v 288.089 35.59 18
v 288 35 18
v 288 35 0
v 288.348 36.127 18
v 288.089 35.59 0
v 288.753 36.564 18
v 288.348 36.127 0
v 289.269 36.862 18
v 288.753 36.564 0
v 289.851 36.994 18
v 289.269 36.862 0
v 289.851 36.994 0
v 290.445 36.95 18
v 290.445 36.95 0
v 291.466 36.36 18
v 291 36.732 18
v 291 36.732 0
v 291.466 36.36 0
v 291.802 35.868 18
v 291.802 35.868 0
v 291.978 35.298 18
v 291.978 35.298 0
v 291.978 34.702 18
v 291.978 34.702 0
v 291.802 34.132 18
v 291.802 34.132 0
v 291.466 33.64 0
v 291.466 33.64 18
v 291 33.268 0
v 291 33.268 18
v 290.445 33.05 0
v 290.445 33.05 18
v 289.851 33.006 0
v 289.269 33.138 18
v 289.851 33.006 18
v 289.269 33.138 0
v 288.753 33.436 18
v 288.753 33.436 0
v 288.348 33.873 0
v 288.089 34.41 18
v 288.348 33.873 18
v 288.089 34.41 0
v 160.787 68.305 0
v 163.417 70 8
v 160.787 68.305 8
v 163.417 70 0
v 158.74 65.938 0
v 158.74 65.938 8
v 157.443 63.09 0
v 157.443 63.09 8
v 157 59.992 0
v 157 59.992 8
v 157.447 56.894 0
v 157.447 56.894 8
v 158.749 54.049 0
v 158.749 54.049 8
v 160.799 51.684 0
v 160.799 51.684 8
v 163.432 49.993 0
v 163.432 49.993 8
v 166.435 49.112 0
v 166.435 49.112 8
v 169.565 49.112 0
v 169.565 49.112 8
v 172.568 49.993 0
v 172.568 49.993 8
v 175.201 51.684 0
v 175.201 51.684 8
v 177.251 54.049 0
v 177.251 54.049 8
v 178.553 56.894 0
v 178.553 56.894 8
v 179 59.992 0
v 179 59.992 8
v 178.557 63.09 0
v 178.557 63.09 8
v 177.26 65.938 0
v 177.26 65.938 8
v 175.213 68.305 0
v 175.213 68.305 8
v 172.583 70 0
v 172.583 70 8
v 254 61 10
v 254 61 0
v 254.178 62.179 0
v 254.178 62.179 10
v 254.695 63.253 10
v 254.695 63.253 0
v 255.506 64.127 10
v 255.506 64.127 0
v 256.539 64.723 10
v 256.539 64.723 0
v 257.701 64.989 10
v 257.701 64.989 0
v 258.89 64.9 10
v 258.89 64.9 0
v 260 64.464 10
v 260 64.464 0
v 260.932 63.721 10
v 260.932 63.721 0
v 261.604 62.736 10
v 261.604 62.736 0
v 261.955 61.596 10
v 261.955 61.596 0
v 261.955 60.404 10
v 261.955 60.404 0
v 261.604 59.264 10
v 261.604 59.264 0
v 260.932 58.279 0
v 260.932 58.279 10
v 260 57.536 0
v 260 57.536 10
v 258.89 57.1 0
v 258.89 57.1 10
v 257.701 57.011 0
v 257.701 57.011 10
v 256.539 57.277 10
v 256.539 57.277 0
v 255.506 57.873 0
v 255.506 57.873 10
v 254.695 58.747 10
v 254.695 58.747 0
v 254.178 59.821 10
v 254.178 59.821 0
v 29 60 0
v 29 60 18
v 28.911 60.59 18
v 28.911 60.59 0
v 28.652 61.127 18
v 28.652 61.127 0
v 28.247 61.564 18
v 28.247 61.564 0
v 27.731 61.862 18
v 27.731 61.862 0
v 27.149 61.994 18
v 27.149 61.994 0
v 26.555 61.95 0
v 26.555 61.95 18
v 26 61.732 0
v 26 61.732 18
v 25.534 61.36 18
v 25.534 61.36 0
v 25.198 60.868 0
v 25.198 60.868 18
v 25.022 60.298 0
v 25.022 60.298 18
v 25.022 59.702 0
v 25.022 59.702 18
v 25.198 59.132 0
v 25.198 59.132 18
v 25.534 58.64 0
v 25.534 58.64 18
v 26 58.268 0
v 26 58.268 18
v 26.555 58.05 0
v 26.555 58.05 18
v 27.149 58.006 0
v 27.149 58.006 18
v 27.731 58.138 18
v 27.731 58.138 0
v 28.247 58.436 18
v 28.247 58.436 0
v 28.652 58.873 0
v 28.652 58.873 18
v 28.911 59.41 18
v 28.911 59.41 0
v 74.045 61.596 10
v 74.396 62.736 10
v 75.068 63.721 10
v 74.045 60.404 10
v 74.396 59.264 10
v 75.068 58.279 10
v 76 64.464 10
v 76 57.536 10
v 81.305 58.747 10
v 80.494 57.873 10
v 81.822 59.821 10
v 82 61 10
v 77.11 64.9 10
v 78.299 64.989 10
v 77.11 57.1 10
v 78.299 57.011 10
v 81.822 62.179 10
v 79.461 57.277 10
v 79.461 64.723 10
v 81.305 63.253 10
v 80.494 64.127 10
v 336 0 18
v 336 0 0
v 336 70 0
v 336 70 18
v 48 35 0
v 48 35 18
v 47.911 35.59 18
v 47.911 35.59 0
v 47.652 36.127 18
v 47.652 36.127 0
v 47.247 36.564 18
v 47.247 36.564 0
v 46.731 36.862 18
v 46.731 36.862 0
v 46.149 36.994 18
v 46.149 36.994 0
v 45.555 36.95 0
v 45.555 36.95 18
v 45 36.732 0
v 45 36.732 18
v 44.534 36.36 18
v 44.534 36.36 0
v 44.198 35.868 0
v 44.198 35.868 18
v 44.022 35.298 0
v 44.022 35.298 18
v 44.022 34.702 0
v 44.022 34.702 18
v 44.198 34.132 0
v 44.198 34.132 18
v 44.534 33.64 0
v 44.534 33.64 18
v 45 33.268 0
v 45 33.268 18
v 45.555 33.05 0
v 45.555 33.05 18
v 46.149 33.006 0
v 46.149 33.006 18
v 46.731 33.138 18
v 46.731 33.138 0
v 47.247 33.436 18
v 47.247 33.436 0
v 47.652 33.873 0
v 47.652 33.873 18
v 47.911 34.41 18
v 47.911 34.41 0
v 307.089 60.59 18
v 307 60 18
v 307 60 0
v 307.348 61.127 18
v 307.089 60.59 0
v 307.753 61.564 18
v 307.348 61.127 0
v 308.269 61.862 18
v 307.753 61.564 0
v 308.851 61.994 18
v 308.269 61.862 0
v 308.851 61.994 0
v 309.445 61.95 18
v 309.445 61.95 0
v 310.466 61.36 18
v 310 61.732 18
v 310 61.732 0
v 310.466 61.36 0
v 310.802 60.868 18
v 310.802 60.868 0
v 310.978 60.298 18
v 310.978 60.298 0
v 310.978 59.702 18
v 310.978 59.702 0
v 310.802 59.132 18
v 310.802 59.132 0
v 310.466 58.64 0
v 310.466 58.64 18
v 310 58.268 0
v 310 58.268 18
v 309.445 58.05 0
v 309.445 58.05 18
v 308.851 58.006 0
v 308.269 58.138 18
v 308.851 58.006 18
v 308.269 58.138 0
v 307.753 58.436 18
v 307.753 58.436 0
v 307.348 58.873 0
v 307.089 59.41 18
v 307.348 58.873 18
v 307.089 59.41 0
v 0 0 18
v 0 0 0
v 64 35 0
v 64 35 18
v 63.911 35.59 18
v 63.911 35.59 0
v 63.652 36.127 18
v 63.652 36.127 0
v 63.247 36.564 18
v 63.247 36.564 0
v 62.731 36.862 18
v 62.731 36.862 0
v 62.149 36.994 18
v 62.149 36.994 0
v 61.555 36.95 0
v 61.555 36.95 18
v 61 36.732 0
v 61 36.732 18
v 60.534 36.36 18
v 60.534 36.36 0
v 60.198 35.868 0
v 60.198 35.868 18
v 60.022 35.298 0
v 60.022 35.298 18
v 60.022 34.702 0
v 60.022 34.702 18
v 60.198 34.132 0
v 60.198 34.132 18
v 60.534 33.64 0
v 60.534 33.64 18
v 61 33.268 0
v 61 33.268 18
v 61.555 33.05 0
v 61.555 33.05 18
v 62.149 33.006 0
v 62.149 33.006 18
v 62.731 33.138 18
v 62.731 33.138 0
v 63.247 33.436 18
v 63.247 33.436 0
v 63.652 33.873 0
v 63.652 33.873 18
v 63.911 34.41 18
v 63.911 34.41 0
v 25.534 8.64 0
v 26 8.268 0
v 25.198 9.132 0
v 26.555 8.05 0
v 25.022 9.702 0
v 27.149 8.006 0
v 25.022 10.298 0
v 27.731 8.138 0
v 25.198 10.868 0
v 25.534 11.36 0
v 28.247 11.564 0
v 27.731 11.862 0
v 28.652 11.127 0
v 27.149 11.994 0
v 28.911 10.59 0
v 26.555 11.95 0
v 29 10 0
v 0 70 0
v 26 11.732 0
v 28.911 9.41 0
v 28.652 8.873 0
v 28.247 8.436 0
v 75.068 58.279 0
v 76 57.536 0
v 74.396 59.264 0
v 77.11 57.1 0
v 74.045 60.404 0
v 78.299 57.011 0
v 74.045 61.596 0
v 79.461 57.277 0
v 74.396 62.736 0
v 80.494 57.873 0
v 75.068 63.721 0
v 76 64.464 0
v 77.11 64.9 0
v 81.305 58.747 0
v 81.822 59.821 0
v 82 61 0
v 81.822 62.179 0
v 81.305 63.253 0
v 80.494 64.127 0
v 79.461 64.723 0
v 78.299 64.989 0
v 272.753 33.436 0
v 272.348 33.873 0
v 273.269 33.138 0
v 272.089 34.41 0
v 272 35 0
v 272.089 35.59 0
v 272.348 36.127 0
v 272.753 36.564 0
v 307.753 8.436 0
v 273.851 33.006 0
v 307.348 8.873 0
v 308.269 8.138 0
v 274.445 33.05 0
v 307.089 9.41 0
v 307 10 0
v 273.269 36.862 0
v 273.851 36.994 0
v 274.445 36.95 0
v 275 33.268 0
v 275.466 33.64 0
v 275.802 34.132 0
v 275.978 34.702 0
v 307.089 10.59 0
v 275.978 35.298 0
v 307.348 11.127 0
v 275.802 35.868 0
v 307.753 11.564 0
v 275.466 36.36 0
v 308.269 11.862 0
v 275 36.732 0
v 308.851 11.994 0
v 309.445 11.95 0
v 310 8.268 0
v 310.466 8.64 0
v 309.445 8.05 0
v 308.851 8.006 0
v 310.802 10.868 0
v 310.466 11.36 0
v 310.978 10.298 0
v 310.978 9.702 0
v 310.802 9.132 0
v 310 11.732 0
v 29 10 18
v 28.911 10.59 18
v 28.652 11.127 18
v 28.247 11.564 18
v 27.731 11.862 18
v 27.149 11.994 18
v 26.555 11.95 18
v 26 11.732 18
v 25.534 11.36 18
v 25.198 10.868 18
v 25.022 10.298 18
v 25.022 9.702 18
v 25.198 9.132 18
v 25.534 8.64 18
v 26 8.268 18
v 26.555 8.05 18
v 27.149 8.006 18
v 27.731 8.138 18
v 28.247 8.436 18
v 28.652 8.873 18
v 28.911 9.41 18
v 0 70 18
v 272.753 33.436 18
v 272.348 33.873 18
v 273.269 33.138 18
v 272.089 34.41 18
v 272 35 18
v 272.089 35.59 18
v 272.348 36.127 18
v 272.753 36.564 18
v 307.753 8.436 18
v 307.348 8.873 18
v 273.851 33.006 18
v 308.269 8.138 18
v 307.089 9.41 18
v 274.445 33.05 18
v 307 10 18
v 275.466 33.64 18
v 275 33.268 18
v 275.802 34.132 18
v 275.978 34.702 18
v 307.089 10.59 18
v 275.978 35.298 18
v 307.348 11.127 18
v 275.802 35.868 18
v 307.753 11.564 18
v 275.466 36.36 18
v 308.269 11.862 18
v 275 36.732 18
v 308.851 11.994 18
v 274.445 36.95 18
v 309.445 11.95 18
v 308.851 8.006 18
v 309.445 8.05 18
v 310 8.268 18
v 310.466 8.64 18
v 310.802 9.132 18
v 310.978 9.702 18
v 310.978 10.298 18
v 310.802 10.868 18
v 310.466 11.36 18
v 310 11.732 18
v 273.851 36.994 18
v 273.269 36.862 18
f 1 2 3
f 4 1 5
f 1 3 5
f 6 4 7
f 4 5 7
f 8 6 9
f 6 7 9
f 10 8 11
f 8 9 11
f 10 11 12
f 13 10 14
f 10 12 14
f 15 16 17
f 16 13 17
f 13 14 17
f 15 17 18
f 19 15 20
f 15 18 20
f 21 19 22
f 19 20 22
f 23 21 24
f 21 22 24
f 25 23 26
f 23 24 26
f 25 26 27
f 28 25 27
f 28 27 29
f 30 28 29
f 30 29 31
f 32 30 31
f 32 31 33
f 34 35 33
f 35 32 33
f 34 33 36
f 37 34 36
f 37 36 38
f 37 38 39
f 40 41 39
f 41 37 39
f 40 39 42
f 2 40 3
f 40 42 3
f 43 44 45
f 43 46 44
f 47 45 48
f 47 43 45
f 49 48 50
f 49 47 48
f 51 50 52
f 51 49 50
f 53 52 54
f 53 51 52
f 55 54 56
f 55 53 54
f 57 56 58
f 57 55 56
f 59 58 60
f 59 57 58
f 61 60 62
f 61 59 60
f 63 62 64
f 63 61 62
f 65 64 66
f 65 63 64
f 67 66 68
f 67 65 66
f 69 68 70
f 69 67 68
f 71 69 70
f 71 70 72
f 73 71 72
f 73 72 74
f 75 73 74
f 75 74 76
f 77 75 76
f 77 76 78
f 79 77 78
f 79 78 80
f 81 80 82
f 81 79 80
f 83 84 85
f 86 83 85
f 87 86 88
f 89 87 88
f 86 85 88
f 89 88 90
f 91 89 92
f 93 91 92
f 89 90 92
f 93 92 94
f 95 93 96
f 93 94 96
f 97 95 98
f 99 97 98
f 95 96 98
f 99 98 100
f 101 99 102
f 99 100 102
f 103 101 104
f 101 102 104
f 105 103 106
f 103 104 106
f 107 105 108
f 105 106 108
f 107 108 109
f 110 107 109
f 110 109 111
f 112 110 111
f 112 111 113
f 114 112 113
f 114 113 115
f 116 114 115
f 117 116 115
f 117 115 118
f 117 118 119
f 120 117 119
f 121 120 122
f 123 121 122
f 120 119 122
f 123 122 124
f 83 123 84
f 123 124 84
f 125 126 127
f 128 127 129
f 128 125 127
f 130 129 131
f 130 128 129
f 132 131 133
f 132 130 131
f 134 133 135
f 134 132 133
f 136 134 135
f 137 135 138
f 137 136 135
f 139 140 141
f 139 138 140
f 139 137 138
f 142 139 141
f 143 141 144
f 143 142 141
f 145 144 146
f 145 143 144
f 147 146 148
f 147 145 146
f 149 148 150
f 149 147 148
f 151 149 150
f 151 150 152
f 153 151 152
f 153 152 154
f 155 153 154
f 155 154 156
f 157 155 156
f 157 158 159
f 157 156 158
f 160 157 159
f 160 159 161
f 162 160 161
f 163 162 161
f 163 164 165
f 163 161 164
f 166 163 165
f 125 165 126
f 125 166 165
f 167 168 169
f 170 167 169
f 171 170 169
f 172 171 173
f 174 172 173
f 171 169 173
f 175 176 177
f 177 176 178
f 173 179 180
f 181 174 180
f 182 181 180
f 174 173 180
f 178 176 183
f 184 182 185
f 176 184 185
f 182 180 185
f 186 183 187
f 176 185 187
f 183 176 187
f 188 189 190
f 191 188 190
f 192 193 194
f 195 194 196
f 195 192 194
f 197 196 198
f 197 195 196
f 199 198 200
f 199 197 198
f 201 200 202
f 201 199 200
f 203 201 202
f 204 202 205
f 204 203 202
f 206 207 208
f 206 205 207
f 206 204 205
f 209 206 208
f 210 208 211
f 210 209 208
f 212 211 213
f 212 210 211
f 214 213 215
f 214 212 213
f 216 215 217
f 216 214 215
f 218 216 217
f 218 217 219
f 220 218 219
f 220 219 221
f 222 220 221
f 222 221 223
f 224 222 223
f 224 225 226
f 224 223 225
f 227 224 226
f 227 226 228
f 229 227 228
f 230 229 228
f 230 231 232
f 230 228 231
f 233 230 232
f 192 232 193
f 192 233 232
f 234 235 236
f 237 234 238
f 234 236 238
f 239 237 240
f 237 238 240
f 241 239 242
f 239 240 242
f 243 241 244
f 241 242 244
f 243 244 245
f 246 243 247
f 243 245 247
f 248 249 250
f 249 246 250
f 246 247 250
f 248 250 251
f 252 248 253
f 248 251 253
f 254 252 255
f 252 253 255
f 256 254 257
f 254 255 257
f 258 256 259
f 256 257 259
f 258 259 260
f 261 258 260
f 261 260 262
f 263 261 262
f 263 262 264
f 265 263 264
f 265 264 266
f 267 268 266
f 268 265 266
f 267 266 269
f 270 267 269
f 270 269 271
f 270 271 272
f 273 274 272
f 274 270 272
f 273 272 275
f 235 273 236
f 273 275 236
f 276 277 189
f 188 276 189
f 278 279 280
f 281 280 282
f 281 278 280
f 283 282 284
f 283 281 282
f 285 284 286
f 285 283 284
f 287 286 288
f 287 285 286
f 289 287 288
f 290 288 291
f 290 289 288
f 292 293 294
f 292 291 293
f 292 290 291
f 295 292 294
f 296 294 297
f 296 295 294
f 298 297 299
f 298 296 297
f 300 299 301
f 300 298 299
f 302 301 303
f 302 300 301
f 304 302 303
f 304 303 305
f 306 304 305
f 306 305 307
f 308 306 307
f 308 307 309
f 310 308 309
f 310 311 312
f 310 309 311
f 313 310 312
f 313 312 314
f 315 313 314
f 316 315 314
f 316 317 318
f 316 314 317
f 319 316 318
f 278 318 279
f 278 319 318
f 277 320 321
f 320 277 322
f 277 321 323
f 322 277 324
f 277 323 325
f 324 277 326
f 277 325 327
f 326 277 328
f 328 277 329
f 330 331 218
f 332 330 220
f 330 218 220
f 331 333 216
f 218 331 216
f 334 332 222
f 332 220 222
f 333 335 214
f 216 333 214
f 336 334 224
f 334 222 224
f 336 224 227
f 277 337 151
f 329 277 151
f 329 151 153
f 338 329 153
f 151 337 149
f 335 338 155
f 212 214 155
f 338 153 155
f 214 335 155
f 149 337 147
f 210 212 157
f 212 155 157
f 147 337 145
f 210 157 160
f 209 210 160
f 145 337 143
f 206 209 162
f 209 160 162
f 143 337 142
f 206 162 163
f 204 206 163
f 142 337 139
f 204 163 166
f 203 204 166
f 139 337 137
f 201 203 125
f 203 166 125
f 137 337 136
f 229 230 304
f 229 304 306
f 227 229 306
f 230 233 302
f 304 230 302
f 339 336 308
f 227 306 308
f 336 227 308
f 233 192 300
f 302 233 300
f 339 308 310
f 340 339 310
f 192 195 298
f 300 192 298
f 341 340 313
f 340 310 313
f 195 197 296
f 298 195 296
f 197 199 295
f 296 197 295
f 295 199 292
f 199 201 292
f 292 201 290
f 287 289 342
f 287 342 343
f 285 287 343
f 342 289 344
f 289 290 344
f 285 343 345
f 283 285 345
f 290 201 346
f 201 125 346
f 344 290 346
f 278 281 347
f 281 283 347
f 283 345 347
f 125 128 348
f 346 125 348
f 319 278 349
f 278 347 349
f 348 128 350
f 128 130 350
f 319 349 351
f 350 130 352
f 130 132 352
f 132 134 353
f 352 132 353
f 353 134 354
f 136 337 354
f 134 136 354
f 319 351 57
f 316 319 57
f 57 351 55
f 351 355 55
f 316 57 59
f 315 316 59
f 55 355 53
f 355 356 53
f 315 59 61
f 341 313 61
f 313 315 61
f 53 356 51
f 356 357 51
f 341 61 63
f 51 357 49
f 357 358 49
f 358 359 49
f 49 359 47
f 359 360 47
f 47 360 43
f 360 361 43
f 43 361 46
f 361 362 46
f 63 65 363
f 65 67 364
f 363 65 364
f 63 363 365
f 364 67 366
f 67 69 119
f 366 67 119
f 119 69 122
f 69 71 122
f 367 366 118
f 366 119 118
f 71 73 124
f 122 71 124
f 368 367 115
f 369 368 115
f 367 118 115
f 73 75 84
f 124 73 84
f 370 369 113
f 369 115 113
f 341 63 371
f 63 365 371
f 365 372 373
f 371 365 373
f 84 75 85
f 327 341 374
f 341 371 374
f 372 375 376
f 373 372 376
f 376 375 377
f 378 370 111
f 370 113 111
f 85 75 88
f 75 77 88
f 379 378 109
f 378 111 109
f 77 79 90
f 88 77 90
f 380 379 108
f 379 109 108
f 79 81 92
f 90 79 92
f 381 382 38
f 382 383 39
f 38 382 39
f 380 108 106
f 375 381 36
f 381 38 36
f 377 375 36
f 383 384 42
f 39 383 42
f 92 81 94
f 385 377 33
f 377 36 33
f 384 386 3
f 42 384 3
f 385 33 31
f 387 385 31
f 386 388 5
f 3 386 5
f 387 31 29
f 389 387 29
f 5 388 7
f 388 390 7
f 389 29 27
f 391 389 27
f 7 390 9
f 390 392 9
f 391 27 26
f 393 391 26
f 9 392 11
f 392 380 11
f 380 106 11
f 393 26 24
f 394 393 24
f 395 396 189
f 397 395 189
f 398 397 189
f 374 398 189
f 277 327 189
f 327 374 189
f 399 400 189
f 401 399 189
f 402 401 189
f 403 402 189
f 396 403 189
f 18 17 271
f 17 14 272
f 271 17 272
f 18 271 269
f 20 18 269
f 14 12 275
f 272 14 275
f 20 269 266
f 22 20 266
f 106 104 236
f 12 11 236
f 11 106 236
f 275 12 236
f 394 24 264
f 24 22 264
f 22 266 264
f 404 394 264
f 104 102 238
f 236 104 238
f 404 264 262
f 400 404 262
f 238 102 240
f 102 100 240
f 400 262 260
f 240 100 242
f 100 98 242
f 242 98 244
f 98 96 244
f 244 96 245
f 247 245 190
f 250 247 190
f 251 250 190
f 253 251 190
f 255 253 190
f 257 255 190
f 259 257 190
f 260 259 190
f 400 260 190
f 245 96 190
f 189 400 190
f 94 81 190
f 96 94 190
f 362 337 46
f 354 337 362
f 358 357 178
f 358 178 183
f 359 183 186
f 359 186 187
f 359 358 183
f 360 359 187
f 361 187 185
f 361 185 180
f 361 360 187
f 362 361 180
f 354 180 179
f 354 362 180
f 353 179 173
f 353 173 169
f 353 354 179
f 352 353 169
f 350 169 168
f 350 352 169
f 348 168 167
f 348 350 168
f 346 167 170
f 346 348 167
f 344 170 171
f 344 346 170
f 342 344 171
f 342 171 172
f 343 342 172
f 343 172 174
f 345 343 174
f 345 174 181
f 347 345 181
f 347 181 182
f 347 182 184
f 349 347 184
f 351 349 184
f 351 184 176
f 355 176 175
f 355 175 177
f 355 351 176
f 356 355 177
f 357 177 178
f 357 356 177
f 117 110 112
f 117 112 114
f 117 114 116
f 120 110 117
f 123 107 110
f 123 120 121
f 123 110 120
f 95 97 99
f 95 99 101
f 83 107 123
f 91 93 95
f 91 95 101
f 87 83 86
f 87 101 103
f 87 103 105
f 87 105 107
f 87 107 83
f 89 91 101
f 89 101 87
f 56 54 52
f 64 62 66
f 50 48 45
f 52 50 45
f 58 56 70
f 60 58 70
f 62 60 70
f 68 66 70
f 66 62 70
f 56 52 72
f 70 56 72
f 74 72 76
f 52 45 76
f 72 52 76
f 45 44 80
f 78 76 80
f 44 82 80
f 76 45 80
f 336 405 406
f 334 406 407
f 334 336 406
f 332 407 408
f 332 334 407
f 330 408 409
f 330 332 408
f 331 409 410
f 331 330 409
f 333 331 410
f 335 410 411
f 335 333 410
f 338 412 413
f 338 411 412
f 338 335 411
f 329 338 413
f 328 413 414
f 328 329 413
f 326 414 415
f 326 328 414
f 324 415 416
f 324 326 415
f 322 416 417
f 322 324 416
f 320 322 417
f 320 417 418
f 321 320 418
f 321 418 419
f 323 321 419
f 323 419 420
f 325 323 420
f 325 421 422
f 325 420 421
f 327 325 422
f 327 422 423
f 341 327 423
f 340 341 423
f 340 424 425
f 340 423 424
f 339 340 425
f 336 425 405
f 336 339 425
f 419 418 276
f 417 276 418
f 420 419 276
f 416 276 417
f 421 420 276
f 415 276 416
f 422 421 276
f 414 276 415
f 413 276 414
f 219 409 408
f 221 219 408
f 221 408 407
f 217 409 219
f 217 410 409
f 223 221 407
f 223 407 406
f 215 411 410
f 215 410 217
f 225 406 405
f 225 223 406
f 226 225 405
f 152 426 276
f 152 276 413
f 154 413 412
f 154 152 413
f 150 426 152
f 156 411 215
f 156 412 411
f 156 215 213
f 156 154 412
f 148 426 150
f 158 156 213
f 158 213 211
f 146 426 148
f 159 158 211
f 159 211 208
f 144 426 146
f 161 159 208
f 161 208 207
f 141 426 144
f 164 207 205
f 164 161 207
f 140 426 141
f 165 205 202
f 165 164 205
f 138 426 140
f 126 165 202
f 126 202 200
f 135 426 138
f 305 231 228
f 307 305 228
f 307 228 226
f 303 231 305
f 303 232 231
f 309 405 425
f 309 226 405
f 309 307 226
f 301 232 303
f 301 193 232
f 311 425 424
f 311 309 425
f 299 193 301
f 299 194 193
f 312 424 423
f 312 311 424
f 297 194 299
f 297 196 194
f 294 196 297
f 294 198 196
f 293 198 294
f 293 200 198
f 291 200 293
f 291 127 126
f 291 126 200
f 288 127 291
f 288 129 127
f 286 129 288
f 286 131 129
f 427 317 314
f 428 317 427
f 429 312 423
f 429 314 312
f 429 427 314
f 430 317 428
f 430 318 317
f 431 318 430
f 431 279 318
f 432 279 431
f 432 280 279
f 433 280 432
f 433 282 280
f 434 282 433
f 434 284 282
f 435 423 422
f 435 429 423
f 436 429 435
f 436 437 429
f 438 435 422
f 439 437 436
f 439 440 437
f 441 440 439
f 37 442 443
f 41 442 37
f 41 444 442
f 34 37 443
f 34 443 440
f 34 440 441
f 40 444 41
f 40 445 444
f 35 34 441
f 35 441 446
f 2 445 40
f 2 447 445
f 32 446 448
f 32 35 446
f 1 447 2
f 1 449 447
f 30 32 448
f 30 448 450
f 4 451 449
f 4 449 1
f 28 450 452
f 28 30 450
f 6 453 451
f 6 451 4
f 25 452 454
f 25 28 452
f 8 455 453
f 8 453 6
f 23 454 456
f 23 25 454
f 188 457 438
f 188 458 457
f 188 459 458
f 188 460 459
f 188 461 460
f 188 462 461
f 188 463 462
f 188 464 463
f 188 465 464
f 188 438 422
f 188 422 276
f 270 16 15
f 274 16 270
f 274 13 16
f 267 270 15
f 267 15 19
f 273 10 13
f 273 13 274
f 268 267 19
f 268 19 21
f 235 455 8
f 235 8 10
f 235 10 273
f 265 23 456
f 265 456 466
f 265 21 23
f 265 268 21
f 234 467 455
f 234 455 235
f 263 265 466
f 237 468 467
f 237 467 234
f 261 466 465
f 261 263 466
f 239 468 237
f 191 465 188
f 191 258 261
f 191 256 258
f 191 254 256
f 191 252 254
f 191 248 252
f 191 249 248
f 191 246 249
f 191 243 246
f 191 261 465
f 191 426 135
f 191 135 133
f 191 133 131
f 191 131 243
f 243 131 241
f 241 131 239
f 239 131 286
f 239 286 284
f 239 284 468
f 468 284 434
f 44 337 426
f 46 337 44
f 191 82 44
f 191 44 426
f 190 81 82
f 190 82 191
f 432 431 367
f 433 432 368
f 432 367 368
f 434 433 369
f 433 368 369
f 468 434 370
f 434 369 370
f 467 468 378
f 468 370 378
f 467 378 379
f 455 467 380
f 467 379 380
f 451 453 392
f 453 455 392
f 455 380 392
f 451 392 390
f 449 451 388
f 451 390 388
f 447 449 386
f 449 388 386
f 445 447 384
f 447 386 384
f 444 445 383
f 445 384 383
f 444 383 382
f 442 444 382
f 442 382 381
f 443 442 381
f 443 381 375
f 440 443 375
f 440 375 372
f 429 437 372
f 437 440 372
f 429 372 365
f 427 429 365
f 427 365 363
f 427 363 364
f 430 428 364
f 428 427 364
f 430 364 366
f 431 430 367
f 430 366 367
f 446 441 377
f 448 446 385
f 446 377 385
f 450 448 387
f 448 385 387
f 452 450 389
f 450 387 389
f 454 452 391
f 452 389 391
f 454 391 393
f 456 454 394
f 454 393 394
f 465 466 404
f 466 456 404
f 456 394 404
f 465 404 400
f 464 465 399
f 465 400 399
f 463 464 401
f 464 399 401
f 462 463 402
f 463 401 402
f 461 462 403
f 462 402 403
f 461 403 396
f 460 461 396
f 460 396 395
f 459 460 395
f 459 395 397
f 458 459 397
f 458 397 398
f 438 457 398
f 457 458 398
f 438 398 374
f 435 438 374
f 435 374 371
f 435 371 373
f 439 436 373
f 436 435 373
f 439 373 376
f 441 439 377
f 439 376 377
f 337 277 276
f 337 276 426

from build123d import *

# Parameters (mm, degrees)
CYLINDER005_R     = 11
CYLINDER005_DEPTH = 8
CYLINDER004_R     = 4
CYLINDER004_DEPTH = 10
CYLINDER002_R     = 2
CYLINDER002_DEPTH = 25
CYLINDER001_R     = 2
CYLINDER001_DEPTH = 25
CYLINDER_R        = 2
CYLINDER_DEPTH    = 25
CYLINDER003_R     = 2
CYLINDER003_DEPTH = 25
BOX_W             = 168
BOX_H             = 70
BOX_DEPTH         = 18


with BuildPart() as cilindro005:
    # Cylinder005 → Cylinder005 (new body)
    with BuildSketch(Plane(origin=(168, 60, 0), x_dir=(1, 0, 0), z_dir=(0, 0, 1))):
        Circle(CYLINDER005_R)
    extrude(amount=CYLINDER005_DEPTH)


with BuildPart() as cilindro004:
    # Cylinder004 → Cylinder004 (new body)
    with BuildSketch(Plane(origin=(78, 61, 0), x_dir=(1, 0, 0), z_dir=(0, 0, 1))):
        Circle(CYLINDER004_R)
    extrude(amount=CYLINDER004_DEPTH)


with BuildPart() as cilindro002:
    # Cylinder002 → Cylinder002 (new body)
    with BuildSketch(Plane(origin=(46, 35, 0), x_dir=(1, 0, 0), z_dir=(0, 0, 1))):
        Circle(CYLINDER002_R)
    extrude(amount=CYLINDER002_DEPTH)


with BuildPart() as cilindro001:
    # Cylinder001 → Cylinder001 (new body)
    with BuildSketch(Plane(origin=(27, 60, 0), x_dir=(1, 0, 0), z_dir=(0, 0, 1))):
        Circle(CYLINDER001_R)
    extrude(amount=CYLINDER001_DEPTH)


with BuildPart() as cilindro:
    # Cylinder → Cylinder (new body)
    with BuildSketch(Plane(origin=(27, 10, 0), x_dir=(1, 0, 0), z_dir=(0, 0, 1))):
        Circle(CYLINDER_R)
    extrude(amount=CYLINDER_DEPTH)


with BuildPart() as fusion:
    # Cylinder003 → Cylinder003 (new body)
    with BuildSketch(Plane(origin=(62, 35, 0), x_dir=(1, 0, 0), z_dir=(0, 0, 1))):
        Circle(CYLINDER003_R)
    extrude(amount=CYLINDER003_DEPTH)

    # Fusion: union Cilindro004, Cilindro002, Cilindro001, Cilindro
    add(cilindro004.part)
    add(cilindro002.part)
    add(cilindro001.part)
    add(cilindro.part)


with BuildPart() as cut:
    # Box → Box (new body)
    with BuildSketch(Plane.XY):
        with Locations((84, 35)):
            Rectangle(BOX_W, BOX_H)
    extrude(amount=BOX_DEPTH)

    # Cut: cut Fusion
    add(fusion.part, mode=Mode.SUBTRACT)


with BuildPart() as cut001:
    # mirror: instance of Cut
    add(cut.part.mirror(Plane(origin=(168, 0, 0), x_dir=(0, -1, 0), z_dir=(1, 0, 0))))

    # Fusion001: union Cut
    add(cut.part)

    # Cut001: cut Cilindro005
    add(cilindro005.part, mode=Mode.SUBTRACT)


solid = cut001.part
